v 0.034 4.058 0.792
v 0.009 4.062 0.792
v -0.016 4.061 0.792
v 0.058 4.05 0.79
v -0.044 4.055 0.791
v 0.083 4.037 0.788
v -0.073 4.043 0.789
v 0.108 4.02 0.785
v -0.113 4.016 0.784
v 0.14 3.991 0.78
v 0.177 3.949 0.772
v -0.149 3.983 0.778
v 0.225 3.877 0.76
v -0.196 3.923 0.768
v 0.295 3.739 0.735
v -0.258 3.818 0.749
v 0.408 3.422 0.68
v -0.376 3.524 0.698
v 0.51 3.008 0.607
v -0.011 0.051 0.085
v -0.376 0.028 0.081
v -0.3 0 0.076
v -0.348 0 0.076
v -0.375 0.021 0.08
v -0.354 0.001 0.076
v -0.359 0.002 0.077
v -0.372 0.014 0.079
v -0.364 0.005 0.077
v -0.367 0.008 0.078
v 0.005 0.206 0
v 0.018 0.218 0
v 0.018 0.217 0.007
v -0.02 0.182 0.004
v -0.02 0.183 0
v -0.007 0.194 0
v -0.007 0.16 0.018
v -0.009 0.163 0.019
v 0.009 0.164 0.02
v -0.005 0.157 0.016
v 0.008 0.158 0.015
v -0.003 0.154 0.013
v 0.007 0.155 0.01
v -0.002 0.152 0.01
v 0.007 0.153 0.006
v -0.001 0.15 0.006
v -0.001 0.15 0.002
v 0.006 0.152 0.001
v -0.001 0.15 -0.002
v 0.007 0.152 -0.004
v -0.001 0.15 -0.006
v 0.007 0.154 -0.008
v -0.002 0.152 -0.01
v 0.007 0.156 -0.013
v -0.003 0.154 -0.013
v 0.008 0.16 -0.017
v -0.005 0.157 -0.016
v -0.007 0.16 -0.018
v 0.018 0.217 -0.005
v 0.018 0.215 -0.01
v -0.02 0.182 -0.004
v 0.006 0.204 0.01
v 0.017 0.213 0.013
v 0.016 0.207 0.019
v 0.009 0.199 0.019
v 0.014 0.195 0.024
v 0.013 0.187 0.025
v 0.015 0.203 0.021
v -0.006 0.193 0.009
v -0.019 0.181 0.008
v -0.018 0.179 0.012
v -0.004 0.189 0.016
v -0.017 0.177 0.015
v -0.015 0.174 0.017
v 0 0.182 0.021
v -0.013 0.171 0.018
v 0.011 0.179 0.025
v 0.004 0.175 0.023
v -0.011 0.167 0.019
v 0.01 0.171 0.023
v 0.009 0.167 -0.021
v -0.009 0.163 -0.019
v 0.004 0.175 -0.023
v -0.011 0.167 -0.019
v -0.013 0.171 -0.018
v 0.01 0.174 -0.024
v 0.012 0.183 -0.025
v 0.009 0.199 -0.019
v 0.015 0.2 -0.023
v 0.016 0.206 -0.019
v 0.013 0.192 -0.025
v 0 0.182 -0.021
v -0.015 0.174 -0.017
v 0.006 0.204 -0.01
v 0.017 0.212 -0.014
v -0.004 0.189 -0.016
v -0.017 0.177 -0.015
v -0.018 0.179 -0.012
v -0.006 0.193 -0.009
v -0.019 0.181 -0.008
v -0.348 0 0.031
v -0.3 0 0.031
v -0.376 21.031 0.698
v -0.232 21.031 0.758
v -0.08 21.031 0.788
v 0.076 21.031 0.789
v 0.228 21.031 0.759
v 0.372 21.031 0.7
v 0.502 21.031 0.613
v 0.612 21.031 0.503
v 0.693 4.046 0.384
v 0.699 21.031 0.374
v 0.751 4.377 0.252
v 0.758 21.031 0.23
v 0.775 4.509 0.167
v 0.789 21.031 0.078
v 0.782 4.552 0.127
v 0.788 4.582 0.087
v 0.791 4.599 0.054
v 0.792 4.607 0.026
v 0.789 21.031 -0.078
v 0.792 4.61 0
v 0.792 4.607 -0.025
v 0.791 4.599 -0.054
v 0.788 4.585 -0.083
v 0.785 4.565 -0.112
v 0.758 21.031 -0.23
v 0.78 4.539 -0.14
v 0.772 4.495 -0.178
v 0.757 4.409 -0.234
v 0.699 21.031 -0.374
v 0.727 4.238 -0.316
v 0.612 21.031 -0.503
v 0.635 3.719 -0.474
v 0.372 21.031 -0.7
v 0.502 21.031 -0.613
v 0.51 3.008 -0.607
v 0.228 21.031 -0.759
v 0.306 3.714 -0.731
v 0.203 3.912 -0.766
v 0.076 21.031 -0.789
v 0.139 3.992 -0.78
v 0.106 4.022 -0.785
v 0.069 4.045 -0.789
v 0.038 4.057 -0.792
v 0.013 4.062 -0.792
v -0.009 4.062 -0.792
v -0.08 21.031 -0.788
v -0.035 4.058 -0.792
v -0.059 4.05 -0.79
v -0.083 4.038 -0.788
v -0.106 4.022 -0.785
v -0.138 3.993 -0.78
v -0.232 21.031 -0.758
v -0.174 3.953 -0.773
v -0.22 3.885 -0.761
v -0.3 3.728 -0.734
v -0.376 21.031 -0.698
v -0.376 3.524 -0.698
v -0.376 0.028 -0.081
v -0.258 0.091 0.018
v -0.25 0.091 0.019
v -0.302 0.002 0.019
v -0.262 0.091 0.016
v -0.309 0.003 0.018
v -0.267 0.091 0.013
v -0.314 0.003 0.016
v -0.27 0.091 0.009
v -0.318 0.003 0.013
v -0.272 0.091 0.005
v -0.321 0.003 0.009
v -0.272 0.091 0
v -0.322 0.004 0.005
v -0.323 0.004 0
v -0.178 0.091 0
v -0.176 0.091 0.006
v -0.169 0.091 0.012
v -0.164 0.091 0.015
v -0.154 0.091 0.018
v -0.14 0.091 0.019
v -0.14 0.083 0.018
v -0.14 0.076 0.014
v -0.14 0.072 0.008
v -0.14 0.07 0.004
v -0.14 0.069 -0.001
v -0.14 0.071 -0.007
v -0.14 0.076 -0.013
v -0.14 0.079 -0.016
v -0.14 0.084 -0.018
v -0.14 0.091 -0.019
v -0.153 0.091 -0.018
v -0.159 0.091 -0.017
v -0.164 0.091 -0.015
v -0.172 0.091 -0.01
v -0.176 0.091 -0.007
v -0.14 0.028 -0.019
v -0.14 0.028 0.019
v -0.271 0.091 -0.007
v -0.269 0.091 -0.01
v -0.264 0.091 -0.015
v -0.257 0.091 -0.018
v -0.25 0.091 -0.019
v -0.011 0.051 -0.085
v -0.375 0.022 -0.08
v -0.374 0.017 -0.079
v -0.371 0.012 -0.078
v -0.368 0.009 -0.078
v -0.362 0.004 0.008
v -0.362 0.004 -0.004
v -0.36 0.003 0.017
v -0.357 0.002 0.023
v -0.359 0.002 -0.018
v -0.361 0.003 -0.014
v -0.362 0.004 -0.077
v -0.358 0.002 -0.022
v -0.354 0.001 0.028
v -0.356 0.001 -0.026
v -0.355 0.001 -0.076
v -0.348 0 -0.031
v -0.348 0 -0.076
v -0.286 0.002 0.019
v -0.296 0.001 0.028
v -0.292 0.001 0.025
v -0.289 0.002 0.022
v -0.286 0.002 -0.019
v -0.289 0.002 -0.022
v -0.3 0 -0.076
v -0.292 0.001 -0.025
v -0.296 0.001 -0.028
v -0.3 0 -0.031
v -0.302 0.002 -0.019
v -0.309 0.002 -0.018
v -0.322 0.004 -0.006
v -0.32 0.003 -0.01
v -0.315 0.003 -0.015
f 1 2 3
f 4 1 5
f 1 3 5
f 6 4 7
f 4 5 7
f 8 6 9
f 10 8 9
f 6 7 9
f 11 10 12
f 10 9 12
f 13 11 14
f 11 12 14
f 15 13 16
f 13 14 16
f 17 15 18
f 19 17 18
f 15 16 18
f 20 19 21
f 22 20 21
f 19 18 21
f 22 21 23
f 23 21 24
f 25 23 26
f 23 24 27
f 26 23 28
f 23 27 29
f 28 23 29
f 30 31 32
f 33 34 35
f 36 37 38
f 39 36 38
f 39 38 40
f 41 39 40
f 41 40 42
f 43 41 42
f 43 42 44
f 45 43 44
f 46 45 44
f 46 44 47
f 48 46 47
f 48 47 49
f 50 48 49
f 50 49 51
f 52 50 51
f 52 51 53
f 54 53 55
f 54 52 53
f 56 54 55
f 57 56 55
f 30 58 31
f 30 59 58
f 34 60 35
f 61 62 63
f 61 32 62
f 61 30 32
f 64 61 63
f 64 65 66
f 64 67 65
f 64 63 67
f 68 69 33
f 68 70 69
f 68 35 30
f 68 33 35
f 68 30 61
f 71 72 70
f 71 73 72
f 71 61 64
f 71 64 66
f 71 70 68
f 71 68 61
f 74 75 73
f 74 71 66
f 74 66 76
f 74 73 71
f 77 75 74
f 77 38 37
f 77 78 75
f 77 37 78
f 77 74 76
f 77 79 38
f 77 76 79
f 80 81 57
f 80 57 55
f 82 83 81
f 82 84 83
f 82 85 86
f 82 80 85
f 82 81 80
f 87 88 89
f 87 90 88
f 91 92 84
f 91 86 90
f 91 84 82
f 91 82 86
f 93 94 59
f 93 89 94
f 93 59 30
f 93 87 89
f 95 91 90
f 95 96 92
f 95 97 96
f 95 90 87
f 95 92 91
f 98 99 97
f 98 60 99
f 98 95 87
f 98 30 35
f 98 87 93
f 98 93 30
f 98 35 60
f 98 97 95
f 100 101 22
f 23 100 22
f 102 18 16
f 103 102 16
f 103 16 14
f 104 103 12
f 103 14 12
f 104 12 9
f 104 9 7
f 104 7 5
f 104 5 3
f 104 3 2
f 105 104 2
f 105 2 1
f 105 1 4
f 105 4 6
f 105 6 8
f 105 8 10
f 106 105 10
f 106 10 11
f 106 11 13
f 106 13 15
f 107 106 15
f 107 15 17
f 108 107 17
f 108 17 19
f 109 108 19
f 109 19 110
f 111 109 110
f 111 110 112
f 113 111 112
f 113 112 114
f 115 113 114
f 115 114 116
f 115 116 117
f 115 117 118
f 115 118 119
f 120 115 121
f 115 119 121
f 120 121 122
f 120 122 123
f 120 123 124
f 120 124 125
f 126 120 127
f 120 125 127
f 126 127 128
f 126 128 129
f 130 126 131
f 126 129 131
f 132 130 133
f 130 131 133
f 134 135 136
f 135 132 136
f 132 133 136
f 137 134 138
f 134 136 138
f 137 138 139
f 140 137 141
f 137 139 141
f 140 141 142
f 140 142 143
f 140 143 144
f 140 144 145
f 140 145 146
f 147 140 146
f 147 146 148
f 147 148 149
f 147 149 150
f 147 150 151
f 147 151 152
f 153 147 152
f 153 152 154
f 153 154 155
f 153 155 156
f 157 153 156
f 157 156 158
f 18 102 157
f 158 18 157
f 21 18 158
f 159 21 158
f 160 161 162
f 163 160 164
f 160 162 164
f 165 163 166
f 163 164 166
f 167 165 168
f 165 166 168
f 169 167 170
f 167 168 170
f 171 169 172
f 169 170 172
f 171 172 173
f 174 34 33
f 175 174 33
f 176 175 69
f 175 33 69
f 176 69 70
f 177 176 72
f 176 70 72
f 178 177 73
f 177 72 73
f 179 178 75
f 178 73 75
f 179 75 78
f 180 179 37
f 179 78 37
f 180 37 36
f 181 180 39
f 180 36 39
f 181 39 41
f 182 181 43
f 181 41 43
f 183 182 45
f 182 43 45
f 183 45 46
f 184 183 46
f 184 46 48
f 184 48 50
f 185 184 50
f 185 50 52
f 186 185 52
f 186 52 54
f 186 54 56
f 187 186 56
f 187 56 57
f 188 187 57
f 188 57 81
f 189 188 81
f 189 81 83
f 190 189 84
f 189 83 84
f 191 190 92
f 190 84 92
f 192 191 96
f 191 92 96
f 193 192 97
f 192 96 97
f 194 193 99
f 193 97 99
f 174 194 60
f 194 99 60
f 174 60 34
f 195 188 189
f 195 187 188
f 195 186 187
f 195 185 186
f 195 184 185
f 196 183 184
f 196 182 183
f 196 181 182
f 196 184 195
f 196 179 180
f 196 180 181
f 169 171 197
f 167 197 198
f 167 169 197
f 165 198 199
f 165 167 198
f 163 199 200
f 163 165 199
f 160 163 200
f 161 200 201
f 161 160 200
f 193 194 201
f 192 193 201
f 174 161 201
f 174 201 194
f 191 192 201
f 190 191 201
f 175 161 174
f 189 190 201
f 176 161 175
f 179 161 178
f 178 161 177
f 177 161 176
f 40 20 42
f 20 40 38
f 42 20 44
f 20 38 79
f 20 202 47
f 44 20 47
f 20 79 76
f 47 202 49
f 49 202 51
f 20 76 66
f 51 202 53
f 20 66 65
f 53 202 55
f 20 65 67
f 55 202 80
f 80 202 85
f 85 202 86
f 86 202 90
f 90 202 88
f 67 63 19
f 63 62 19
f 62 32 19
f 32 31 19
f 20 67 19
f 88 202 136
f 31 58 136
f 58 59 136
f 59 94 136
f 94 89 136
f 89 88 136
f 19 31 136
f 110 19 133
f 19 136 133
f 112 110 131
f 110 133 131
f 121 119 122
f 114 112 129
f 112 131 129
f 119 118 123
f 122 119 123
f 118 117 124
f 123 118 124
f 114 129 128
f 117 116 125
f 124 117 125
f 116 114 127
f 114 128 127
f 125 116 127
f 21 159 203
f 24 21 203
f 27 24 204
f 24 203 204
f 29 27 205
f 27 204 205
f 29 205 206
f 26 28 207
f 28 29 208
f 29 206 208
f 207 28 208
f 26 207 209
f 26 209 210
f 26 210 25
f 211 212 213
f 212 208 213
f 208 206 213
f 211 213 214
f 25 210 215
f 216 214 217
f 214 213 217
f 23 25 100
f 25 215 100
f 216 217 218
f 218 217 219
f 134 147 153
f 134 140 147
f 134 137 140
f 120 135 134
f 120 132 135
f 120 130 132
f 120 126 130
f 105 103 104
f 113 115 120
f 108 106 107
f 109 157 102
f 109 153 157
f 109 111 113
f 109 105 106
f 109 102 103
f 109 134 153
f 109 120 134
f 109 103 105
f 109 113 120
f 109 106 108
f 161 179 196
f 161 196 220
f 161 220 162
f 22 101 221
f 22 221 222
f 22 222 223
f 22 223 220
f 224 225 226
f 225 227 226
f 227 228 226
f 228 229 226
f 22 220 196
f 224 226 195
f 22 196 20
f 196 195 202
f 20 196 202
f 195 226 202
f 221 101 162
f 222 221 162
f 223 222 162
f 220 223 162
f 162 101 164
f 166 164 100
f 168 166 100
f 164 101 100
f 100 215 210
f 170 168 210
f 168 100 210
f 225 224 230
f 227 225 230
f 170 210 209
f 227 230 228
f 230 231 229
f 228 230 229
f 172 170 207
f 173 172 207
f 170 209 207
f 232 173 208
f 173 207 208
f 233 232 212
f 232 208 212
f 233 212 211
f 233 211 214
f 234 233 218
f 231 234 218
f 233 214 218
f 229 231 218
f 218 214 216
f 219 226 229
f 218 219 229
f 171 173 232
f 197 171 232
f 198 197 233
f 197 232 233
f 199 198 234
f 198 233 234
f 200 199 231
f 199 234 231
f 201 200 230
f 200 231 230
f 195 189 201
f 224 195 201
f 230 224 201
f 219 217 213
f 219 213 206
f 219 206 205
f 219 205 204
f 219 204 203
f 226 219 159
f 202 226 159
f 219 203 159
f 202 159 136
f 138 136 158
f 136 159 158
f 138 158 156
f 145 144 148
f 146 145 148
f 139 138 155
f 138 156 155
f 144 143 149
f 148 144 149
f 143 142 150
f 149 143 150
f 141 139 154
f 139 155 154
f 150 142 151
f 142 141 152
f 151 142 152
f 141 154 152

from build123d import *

# Parameters (mm, degrees)
TD_SKETCH_R                             = 0.79248
TL_FEATURE_DEPTH                        = 21.0312
TDF_STD_SKETCH_W                        = 2.09296
TDF_STD_SKETCH_H                        = 2.09296
TDF_STD_FEATURE_DEPTH                   = 22.061040395
ISA_20_STD_FEATURE_DEPTH                = 22.061040395
ISA_20_STD_FEATURE_DEPTH_BACK           = 22.061040395
F_10BA_STD_FEATURE_DEPTH                = 22.061040395
F_10BA_STD_FEATURE_DEPTH_BACK           = 22.061040395
FRO_STD_FEATURE_DEPTH                   = 22.061040395
FRO_STD_FEATURE_DEPTH_BACK              = 22.061040395
C_STD_FEATURE_DEPTH                     = 22.061040395
C_STD_FEATURE_DEPTH_BACK                = 22.061040395
ERW_STD_FEATURE_DEPTH                   = 0.01905
H_STD_FEATURE_REACH                     = 22.896
H_STD_SKETCH_R                          = 0.01905
H_STD_SKETCH_3_R                        = 0.01905
FUNNEL_FINAL_DIAMETRE_STD_FEATURE_DEPTH = 2.499995
FUNNEL_FINAL_DIAMETRE_STD_FEATURE_DRAFT = -13
ROUND_BR_STD_FEATURE_START              = -1
ROUND_BR_STD_FEATURE_DEPTH              = 1.009339363


with BuildPart() as part:
    # TD_sketch → TL_feature (new body)
    with BuildSketch(Plane(origin=(0, 0, 0), x_dir=(1, 0, 0), z_dir=(0, 1, 0))):
        with Locations(Location((0, 0, 0), (0, 0, 270))):
            Circle(TD_SKETCH_R)
    extrude(amount=TL_FEATURE_DEPTH)

    # TDF_STD_sketch → TDF_STD_feature (cut, through all)
    with BuildSketch(Plane(origin=(0, 0, 0), x_dir=(1, 0, 0), z_dir=(0, 1, 0))):
        with Locations((-1.4224, 0)):
            Rectangle(TDF_STD_SKETCH_W, TDF_STD_SKETCH_H)
    extrude(amount=TDF_STD_FEATURE_DEPTH, mode=Mode.SUBTRACT)

    # ISA_20_STD_sketch → ISA_20_STD_feature (cut, two sides: drawn at the far end of the back side and taken through both)
    with BuildSketch(Plane(origin=(0, 0, 0), x_dir=(0, 0, -1), z_dir=(1, 0, 0)).offset(-ISA_20_STD_FEATURE_DEPTH_BACK)):
        Polygon((-12.996080373, 73.27228267), (-3.784567997, 21.0312), (-0.0762, 0), (0.0762, 0), (3.784567997, 21.0312), (12.996080373, 73.27228267), (12.996080373, -32.821688483), (-12.996080373, -32.821688483), align=None)
    extrude(amount=ISA_20_STD_FEATURE_DEPTH + ISA_20_STD_FEATURE_DEPTH_BACK, mode=Mode.SUBTRACT)

    # 10BA_STD_sketch → 10BA_STD_feature (cut, two sides: drawn at the far end of the back side and taken through both)
    with BuildSketch(Plane.XY.offset(-F_10BA_STD_FEATURE_DEPTH_BACK)):
        Polygon((-53.216424634, 0), (-0.37592, 0), (-0.29972, 0), (-0.011354365, 0.050846642), (3.688047997, 21.0312), (12.863705333, 73.068938636), (91.245889802, 2.18375769), (25.165759835, -70.885180946), align=None)
    extrude(amount=F_10BA_STD_FEATURE_DEPTH + F_10BA_STD_FEATURE_DEPTH_BACK, mode=Mode.SUBTRACT)

    # FRO_STD_sketch → FRO_STD_feature (cut, two sides: drawn at the far end of the back side and taken through both)
    with BuildSketch(Plane.XY.offset(-FRO_STD_FEATURE_DEPTH_BACK)):
        with BuildLine():
            Line((-0.37592, 52.152138388), (-0.37592, 0.02794))
            ThreePointArc((-0.37592, 0.02794), (-0.367736563, 0.008183437), (-0.34798, 0))
            Line((-0.34798, 0), (51.776218388, 0))
            Line((51.776218388, 0), (-21.9385299, -73.714748288))
            Line((-21.9385299, -73.714748288), (-74.090668288, -21.5626099))
            Line((-74.090668288, -21.5626099), (-0.37592, 52.152138388))
        make_face()
    extrude(amount=FRO_STD_FEATURE_DEPTH + FRO_STD_FEATURE_DEPTH_BACK, mode=Mode.SUBTRACT)

    # C_STD_sketch → C_STD_feature (cut, two sides: drawn at the far end of the back side and taken through both)
    with BuildSketch(Plane(origin=(0, 0, 0), x_dir=(0, 0, -1), z_dir=(1, 0, 0)).offset(-C_STD_FEATURE_DEPTH_BACK)):
        with BuildLine():
            Line((-50.530423385, -12.791040855), (-0.030559272, 0))
            ThreePointArc((-0.030559272, 0), (0, 0.00381), (0.030559272, 0))
            Line((0.030559272, 0), (50.530423385, -12.791040855))
            Line((50.530423385, -12.791040855), (50.530423385, -116.980234183))
            Line((50.530423385, -116.980234183), (-50.530423385, -116.980234183))
            Line((-50.530423385, -116.980234183), (-50.530423385, -12.791040855))
        make_face()
    extrude(amount=C_STD_FEATURE_DEPTH + C_STD_FEATURE_DEPTH_BACK, mode=Mode.SUBTRACT)


with BuildPart() as body_2:
    # ERW_STD_sketch → ERW_STD_feature (new, symmetric)
    with BuildSketch(Plane.XY):
        Polygon((-0.1397, 0.09144), (-0.1397, 0), (-0.32512, 0), (-0.272327091, 0.09144), align=None)
    extrude(amount=ERW_STD_FEATURE_DEPTH, both=True)

    # H_STD_sketch → H_STD_feature (add, up to next)
    with BuildSketch(Plane(origin=(-0.010357492, 0.166115932, 0), x_dir=(0, 0, -1), z_dir=(0.8660254037844415, 0.4999999999999953, 0)), mode=Mode.PRIVATE) as h_std_feature_sk1:
        with Locations(Location((0, 0, 0), (0, 0, 90))):
            Circle(H_STD_SKETCH_R)
    h_std_feature_tool1 = extrude(h_std_feature_sk1.sketch, amount=-H_STD_FEATURE_REACH, mode=Mode.PRIVATE) - body_2.part
    add(h_std_feature_tool1.solids().sort_by_distance((-0.010357, 0.166116, 0))[0])


with BuildPart() as funnel_final_diametre_std_feature_tool:
    # H_STD_sketch<3> → funnel_final_diametre_STD_feature (with draft: the straight prism first)
    with BuildSketch(Plane(origin=(-0.010357492, 0.166115932, 0), x_dir=(0, 0, -1), z_dir=(0.8660254037844415, 0.4999999999999953, 0))):
        with Locations(Location((0, 0, 0), (0, 0, 90))):
            Circle(H_STD_SKETCH_3_R)
    extrude(amount=FUNNEL_FINAL_DIAMETRE_STD_FEATURE_DEPTH)
    # funnel_final_diametre_STD_feature: the draft: its side faces are tilted about the plane it starts from
    funnel_final_diametre_std_feature_sides = [funnel_final_diametre_std_feature_tool.faces().sort_by_distance(p)[0] for p in [
        (1.081697098, 0.774616898, 0),
    ]]
    draft(funnel_final_diametre_std_feature_sides, Plane(origin=(-0.010357492, 0.166115932, 0), x_dir=(0, 0, -1), z_dir=(0.8660254037844415, 0.4999999999999953, 0)), FUNNEL_FINAL_DIAMETRE_STD_FEATURE_DRAFT)


with BuildPart() as body_2_1:
    add(body_2.part)

    # funnel_final_diametre_STD_feature: add funnel_final_diametre_std_feature_tool
    add(funnel_final_diametre_std_feature_tool.part)

    # ROUND_BR_STD_feature: read off the stored shape, not the designer's step
    # ROUND_BR_STD_feature outline → ROUND_BR_STD_feature (cut)
    with BuildSketch(Plane(origin=(0, 0, 0), x_dir=(0.8660254037844362, -0.5000000000000042, 0), z_dir=(0.5000000000000042, 0.8660254037844363, 0)).offset(ROUND_BR_STD_FEATURE_START)):
        with BuildLine():
            Line((-0.281562179, -0.01905), (-0.262512179, -0.01905))
            ThreePointArc((-0.262512179, -0.01905), (-0.275982563, -0.013470384), (-0.281562179, 0))
            Line((-0.281562179, 0), (-0.281562179, -0.01905))
        make_face()
        with BuildLine():
            Line((-0.281562179, 0.01905), (-0.281562179, 0))
            ThreePointArc((-0.281562179, 0), (-0.275982563, 0.013470384), (-0.262512179, 0.01905))
            Line((-0.262512179, 0.01905), (-0.281562179, 0.01905))
        make_face()
    extrude(amount=ROUND_BR_STD_FEATURE_DEPTH, mode=Mode.SUBTRACT)


with BuildPart() as part_1:
    add(part.part)

    # COMBINE_STD_feature: cut body 2
    add(body_2_1.part, mode=Mode.SUBTRACT)


solid = part_1.part
